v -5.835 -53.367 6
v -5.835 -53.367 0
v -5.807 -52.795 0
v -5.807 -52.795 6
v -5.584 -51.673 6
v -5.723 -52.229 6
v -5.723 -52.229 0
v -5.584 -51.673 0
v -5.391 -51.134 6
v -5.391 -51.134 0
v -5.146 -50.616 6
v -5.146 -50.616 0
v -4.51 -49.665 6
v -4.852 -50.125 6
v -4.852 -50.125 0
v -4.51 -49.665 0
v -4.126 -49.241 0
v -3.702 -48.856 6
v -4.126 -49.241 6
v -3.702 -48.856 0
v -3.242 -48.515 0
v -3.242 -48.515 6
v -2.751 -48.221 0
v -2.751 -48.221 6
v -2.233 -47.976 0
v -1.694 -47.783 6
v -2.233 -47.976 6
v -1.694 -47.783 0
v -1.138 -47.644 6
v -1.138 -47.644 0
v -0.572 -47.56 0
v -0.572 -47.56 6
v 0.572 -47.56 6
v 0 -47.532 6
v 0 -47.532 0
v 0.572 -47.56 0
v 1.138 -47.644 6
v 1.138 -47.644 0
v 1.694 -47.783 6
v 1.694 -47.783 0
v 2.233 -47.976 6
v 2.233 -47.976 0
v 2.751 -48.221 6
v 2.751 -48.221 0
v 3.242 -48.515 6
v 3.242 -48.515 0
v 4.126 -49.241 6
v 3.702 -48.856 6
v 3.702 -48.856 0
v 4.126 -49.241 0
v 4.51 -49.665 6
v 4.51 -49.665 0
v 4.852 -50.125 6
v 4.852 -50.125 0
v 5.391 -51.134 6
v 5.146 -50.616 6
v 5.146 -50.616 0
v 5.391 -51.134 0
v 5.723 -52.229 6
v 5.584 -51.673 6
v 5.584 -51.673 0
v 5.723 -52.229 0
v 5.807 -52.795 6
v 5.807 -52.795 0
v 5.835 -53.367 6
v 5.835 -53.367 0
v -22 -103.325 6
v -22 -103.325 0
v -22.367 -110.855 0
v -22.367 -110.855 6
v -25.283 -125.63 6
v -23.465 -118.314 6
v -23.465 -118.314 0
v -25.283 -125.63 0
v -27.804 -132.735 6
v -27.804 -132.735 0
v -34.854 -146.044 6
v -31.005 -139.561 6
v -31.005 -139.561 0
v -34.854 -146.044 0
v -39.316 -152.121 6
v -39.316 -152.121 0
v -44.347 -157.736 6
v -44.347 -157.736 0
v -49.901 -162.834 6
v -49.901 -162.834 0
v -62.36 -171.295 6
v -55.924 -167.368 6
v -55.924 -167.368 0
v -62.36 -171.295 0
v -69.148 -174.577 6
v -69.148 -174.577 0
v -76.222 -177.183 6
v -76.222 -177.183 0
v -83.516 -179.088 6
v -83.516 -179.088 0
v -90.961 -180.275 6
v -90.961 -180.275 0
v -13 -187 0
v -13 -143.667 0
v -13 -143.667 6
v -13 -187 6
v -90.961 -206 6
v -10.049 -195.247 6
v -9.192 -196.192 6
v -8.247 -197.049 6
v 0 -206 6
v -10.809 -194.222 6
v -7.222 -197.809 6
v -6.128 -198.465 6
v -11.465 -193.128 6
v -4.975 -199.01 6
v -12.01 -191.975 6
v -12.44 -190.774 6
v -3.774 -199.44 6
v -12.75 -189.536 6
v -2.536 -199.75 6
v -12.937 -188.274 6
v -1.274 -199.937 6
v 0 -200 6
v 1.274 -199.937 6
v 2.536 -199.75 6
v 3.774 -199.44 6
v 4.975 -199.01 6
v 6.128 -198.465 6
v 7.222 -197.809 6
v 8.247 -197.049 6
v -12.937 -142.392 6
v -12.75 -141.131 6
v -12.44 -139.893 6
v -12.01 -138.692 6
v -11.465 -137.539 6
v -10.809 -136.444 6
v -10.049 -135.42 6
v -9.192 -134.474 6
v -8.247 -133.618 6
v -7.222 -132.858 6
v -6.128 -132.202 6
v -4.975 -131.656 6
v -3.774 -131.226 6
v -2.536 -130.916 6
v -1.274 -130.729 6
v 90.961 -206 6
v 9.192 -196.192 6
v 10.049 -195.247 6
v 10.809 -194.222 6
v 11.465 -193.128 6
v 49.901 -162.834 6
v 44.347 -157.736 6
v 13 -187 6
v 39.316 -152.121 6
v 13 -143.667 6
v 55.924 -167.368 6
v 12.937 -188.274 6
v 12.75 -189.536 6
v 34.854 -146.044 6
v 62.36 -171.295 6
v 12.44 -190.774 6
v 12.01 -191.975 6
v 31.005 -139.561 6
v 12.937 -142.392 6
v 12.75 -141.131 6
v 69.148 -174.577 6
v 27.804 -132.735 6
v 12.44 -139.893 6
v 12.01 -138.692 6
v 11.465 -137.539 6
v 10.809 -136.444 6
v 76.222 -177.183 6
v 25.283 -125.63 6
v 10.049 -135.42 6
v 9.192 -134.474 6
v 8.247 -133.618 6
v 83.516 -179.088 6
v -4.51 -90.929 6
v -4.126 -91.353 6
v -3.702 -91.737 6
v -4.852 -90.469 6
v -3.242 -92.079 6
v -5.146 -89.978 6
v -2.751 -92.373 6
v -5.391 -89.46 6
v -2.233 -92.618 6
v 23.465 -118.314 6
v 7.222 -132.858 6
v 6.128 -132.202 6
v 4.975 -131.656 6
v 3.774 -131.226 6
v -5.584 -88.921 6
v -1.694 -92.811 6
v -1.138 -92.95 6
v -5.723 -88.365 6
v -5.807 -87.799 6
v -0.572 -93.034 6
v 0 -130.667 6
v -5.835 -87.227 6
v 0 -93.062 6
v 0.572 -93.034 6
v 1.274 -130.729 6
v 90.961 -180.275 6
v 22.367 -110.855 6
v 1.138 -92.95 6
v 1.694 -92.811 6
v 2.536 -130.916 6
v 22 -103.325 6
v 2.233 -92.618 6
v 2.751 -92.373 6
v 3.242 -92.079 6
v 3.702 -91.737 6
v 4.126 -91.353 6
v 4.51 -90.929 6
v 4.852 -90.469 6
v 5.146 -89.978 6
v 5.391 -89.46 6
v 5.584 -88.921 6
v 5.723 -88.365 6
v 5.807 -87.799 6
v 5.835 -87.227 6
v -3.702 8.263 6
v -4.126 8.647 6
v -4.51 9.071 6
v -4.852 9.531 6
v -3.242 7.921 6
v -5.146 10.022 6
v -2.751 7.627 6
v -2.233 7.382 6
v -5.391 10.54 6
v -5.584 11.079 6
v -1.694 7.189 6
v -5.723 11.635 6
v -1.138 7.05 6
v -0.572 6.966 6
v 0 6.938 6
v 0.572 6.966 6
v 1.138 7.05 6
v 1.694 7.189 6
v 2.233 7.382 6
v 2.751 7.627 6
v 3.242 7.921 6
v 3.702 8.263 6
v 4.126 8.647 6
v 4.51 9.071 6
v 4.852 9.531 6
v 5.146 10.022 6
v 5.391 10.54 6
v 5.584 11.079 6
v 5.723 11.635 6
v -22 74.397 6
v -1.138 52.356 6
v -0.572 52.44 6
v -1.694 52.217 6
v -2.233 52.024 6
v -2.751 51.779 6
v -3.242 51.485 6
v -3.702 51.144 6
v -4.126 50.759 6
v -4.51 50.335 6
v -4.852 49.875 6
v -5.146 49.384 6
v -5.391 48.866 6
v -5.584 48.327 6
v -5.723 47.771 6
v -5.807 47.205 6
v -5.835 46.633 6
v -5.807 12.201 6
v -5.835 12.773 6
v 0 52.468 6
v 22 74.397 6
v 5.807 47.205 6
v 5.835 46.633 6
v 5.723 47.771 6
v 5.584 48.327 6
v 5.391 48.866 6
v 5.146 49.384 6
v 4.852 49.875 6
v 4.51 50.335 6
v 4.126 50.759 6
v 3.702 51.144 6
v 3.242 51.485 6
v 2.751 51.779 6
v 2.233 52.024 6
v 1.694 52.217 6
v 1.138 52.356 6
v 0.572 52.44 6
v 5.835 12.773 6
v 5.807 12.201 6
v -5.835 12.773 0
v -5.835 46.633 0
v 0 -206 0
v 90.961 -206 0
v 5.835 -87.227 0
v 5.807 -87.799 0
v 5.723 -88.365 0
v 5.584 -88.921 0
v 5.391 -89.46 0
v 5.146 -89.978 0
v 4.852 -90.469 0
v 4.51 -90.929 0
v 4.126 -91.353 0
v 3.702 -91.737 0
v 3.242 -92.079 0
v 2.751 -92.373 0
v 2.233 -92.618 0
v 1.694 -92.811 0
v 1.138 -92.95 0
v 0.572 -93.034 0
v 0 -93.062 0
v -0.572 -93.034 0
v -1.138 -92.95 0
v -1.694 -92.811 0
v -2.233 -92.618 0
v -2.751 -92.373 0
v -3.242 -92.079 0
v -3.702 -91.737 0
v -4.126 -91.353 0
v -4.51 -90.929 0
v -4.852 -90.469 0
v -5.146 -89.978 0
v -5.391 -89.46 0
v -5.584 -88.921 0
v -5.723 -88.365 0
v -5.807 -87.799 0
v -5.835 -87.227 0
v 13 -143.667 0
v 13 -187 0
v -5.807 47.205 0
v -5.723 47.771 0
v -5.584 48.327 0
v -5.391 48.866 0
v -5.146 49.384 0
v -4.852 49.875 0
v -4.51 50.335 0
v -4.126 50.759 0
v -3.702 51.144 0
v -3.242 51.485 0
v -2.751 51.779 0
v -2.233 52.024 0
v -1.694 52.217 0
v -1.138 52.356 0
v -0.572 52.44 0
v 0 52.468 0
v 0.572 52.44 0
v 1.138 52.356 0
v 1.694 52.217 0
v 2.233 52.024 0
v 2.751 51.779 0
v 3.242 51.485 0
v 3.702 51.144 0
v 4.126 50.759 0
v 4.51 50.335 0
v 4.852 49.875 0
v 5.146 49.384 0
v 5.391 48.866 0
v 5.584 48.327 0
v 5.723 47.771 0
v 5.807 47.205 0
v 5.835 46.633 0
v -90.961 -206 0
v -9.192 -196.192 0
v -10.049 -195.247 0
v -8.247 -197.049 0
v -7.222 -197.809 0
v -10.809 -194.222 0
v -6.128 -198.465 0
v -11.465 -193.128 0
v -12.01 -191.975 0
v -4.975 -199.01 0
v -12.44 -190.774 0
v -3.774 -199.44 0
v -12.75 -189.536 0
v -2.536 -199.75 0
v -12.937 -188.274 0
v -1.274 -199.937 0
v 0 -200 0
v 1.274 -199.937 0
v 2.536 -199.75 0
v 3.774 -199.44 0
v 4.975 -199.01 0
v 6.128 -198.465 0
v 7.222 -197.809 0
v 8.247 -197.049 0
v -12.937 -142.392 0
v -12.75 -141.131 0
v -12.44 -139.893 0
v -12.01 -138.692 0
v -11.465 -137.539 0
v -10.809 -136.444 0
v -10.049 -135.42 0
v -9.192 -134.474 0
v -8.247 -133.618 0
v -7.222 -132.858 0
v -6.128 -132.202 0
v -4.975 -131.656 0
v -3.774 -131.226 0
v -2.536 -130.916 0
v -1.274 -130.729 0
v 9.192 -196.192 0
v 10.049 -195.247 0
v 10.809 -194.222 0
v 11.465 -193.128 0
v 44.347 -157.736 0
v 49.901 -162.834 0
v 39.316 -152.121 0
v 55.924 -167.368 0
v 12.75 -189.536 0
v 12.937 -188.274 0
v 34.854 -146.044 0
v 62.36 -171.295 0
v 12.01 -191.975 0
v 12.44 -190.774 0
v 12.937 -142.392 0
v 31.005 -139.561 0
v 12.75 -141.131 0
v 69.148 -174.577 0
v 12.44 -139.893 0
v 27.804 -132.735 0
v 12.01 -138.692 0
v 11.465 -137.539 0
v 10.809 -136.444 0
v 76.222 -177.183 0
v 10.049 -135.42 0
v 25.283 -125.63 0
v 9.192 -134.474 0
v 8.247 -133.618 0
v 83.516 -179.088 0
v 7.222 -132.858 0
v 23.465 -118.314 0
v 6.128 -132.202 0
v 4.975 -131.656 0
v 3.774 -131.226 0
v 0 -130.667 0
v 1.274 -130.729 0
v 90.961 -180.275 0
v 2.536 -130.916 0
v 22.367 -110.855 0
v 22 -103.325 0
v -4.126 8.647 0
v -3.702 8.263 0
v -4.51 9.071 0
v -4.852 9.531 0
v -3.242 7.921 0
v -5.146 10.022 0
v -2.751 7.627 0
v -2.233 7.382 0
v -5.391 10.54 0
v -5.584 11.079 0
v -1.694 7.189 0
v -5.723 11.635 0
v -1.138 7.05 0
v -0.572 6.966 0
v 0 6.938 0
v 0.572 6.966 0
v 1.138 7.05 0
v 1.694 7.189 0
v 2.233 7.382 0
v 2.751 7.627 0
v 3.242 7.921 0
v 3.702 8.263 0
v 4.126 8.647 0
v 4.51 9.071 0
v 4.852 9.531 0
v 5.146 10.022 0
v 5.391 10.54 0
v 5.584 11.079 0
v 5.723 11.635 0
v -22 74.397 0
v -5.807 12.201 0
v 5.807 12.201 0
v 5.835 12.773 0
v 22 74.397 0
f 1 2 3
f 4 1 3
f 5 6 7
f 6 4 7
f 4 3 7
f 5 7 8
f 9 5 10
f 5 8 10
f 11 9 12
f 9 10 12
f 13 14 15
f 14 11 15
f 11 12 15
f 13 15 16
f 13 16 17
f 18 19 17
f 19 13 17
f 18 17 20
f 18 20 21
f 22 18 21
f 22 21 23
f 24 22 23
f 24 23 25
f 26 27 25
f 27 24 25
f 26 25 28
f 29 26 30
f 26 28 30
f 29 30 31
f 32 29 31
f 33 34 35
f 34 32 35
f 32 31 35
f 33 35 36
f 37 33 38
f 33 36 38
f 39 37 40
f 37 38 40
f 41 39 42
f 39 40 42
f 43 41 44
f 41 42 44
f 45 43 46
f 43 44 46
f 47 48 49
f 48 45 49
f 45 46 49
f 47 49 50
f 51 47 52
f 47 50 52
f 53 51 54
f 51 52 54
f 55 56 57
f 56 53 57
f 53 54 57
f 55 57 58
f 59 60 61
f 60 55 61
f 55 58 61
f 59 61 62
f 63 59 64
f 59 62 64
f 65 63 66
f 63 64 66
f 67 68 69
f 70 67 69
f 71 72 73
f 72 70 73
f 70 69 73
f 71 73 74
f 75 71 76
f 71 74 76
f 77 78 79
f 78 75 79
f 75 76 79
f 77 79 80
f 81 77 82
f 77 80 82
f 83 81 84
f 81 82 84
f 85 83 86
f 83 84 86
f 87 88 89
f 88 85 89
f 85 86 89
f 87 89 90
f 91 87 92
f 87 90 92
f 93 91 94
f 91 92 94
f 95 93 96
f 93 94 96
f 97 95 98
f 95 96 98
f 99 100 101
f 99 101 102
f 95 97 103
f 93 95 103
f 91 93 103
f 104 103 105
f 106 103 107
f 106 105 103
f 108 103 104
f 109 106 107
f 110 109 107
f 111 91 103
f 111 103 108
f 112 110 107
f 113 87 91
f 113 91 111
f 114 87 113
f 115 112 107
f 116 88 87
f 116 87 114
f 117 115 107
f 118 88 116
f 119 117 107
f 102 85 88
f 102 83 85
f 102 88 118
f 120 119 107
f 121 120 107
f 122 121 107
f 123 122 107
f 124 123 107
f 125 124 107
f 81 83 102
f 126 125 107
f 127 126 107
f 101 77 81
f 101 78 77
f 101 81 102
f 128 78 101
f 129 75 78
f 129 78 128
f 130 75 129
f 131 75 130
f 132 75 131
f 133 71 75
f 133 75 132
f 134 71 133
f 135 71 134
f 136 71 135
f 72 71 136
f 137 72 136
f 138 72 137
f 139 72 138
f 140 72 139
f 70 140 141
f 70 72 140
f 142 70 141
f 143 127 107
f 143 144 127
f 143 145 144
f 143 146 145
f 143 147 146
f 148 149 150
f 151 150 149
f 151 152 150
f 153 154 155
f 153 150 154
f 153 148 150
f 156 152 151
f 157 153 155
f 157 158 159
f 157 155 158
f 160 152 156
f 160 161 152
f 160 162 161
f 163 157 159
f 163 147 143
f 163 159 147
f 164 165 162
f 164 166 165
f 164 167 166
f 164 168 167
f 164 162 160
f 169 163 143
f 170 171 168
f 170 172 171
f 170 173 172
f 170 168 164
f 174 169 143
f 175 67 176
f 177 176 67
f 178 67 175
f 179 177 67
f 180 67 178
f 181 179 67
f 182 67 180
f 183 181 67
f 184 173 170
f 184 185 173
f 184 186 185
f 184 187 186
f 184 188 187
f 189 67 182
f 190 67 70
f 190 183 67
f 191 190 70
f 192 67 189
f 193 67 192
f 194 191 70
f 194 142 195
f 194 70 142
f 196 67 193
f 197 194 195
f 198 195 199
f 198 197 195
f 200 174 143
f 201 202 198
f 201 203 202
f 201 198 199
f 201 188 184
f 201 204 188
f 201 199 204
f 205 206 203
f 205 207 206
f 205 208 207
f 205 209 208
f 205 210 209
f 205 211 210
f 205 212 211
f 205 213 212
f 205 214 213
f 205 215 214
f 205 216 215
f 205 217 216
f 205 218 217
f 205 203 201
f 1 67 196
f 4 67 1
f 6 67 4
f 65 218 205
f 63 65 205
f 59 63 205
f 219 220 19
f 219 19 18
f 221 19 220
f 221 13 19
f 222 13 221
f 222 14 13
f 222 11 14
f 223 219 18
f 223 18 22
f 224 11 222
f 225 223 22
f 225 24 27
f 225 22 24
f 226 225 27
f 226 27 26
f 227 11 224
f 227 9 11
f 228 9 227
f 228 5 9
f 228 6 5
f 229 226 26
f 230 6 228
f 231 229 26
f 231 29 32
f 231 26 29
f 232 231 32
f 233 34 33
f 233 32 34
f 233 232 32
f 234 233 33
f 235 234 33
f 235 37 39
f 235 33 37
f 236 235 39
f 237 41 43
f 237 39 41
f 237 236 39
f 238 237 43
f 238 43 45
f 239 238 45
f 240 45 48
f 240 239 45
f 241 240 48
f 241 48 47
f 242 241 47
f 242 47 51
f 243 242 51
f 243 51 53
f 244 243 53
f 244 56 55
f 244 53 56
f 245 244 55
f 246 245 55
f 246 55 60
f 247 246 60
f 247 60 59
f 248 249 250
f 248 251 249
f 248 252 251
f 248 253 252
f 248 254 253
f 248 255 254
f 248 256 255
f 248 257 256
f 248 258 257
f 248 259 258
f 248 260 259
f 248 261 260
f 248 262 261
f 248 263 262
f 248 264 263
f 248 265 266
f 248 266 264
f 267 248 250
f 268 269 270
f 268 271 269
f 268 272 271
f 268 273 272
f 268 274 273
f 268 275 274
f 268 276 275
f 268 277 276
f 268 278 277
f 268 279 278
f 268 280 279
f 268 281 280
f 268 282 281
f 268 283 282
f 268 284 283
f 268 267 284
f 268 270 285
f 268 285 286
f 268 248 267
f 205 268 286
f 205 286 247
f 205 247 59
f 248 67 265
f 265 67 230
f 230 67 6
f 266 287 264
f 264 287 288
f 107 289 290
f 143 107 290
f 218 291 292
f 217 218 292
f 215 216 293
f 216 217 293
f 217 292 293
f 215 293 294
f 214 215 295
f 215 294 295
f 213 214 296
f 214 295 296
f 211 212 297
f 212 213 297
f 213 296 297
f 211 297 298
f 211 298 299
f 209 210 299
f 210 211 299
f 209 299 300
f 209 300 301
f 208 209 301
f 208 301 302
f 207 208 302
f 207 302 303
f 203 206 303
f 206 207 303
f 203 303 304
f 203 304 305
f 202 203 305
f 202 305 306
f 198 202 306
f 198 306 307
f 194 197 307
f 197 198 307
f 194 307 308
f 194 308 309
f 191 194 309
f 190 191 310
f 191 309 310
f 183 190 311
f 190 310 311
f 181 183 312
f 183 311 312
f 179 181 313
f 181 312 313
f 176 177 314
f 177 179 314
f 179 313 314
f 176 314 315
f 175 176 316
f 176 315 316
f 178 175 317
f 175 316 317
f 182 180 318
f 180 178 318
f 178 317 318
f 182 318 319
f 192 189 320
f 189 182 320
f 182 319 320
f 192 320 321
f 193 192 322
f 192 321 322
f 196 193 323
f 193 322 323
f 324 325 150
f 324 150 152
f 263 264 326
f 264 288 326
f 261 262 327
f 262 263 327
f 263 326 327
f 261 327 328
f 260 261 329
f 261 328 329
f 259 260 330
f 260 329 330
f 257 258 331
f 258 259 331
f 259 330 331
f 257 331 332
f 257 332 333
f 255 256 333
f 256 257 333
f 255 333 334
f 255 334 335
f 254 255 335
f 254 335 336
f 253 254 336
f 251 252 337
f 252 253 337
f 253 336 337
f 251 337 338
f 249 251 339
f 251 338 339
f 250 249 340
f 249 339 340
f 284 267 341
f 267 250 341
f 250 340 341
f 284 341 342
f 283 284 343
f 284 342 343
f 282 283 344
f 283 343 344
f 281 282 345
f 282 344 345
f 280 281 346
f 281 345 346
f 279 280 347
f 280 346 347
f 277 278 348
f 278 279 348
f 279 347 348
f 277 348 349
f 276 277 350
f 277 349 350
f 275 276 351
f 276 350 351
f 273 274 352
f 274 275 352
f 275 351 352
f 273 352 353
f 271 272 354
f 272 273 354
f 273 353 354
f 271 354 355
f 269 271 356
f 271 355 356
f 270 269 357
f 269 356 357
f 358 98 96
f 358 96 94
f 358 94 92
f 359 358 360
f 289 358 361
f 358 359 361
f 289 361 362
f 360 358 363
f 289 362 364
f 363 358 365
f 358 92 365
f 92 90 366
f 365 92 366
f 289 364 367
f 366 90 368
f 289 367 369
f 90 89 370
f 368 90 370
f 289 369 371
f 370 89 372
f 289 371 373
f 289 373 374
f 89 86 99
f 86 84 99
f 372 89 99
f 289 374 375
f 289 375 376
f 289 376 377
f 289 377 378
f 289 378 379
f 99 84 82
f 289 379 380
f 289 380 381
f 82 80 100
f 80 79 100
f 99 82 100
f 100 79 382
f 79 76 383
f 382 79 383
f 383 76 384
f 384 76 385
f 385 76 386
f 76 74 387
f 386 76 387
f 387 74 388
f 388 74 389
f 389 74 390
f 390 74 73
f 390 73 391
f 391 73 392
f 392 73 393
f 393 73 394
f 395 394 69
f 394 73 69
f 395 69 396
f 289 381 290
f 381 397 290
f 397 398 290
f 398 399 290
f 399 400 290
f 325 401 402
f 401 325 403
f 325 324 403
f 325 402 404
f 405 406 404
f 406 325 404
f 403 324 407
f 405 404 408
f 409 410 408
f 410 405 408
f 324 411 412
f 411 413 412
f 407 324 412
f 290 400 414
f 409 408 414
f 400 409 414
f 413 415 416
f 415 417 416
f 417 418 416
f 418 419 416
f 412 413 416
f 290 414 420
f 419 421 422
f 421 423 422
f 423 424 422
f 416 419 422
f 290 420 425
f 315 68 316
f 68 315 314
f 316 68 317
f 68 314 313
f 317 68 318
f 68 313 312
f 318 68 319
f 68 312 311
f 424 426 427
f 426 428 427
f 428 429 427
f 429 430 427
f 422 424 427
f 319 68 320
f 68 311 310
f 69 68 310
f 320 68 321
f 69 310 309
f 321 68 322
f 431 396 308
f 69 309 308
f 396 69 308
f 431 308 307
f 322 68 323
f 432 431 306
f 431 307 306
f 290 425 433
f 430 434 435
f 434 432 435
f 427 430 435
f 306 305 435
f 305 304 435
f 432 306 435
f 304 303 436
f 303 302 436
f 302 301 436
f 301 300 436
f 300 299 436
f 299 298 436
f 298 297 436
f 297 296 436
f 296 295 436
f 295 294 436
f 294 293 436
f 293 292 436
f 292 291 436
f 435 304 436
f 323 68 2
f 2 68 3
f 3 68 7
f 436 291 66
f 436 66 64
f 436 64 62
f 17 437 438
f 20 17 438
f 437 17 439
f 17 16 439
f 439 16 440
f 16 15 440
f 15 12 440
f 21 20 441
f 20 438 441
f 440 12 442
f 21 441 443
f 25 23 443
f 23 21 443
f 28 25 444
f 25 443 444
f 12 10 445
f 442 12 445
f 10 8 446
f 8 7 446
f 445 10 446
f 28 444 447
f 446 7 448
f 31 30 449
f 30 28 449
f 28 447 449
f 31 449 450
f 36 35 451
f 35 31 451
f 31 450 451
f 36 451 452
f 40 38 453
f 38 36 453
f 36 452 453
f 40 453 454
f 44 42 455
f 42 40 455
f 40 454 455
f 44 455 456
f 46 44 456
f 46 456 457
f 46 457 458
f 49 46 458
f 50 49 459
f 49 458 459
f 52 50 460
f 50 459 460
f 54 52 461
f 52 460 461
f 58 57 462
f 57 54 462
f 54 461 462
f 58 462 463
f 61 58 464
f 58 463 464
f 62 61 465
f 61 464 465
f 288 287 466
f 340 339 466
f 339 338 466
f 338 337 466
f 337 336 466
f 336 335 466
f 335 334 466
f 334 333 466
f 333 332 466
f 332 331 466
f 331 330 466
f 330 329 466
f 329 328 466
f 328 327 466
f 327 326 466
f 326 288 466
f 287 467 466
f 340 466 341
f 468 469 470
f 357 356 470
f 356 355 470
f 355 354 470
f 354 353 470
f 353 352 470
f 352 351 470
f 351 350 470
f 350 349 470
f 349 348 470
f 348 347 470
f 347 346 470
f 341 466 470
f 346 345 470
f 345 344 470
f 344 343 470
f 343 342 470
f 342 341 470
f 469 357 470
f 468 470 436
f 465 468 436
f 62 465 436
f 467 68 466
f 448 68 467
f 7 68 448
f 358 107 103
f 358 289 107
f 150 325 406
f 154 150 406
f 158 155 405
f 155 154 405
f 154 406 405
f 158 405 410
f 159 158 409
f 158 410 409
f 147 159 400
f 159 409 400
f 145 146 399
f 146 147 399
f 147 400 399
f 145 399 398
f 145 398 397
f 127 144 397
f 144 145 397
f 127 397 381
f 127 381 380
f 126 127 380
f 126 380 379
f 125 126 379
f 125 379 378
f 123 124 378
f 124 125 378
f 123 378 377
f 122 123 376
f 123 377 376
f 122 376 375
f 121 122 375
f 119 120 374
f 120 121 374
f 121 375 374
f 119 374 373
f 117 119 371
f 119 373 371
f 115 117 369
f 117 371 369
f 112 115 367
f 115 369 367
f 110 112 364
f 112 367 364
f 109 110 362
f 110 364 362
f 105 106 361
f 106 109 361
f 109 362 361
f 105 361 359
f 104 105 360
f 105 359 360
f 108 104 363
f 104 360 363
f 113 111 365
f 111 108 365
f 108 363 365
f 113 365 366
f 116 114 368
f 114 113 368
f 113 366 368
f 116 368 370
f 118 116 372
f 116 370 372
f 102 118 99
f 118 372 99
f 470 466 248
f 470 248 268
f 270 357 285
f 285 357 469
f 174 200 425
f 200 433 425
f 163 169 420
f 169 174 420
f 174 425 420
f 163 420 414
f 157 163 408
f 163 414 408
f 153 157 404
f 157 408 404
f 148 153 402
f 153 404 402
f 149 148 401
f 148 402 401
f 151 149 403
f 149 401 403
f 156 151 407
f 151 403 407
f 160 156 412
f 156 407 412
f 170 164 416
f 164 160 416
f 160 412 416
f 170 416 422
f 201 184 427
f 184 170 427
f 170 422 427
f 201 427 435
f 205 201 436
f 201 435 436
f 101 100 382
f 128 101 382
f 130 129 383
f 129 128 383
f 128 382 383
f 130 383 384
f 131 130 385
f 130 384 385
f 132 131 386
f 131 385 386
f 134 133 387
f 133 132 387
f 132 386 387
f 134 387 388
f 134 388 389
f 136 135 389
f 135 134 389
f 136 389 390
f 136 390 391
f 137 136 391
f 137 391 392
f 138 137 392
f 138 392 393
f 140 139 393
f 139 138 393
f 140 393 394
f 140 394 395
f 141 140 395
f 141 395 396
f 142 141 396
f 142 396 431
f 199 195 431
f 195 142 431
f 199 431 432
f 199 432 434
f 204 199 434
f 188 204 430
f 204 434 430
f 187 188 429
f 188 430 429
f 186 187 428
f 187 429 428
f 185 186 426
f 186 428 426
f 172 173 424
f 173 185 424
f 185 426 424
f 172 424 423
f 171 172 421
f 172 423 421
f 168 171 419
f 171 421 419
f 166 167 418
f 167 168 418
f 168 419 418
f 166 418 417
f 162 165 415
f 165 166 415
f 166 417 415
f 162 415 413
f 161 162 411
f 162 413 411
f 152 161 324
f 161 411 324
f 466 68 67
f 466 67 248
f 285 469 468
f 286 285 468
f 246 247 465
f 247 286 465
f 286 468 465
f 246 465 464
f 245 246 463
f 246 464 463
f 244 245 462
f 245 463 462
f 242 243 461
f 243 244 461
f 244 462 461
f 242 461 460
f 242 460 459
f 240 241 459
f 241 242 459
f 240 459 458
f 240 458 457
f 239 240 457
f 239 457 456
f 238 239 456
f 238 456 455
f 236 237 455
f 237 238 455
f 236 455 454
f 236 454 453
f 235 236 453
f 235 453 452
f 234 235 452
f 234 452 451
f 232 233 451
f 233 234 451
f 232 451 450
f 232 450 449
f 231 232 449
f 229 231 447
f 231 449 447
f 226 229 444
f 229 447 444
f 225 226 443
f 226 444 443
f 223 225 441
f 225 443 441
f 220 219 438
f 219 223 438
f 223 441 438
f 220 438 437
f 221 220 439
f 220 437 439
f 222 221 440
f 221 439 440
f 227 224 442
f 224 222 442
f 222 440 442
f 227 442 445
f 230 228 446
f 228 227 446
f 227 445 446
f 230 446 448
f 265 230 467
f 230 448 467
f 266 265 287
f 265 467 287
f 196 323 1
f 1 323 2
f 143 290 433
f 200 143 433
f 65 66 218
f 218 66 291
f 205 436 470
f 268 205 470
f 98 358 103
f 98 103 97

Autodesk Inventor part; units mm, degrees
ref_plane "YZ Plane" through (0, 0, 0) normal (1, 0, 0) x (0, 1, 0)
ref_plane "XZ Plane" through (0, 0, 0) normal (0, 1, 0) x (-1, 0, 0)
ref_plane "XY Plane" through (0, 0, 0) normal (0, 0, 1) x (1, 0, 0)
sketch "Sketch1" plane through (0, 0, 0) normal (0, 0, 1) x (1, 0, 0)
  line L0 (10, -206) -> (-10, -206) construction
  line L1 (0, 0) -> (0, -45.7411)
  line L2 (-10, -206) -> (10, -206) construction
  arc A0 (-10, -160.3333) -> (10, -160.3333) centre (0, -160.3333) ccw projected
  line L3 (10, -143.6667) -> (10, -160.3333) projected
  line L4 (-10, -160.3333) -> (-10, -143.6667) projected
  arc A1 (10, -143.6667) -> (-10, -143.6667) centre (0, -143.6667) ccw projected
  circle A2 centre (-8, -187) radius 1.6 projected
  circle A3 centre (8, -187) radius 1.6 projected
  arc A4 (-5.8349, -87.227) -> (5.8349, -87.227) centre (0, -87.227) ccw projected
  line L5 (5.8349, -53.3669) -> (5.8349, -87.227) projected
  line L6 (-5.8349, -87.227) -> (-5.8349, -53.3669) projected
  arc A5 (5.8349, -53.3669) -> (-5.8349, -53.3669) centre (0, -53.3669) ccw projected
  line L7 (0, -206) -> (-90.9613, -206)
  line L8 (-90.9613, -206) -> (-90.9613, -180.2754)
  arc A6 (-90.9613, -180.2754) -> (-22, -103.3247) centre (-99.4135, -103.3247) ccw
  line L9 (-22, -103.3247) -> (-22, 74.3972)
  line L10 (0, -143.6667) -> (0, -187) construction
  line L11 (-13, -143.6667) -> (-13, -187)
  line L12 (13, -187) -> (13, -143.6667)
  arc A7 (13, -143.6667) -> (-13, -143.6667) centre (0, -143.6667) ccw
  arc A8 (-13, -187) -> (13, -187) centre (0, -187) ccw
  line L13 (0, -206) -> (90.9613, -206)
  line L14 (90.9613, -206) -> (90.9613, -180.2754)
  arc A9 (22, -103.3247) -> (90.9613, -180.2754) centre (99.4135, -103.3247) ccw
  line L15 (22, -103.3247) -> (22, 74.3972)
  line L16 (5.8349, 46.6331) -> (5.8349, 12.773) projected
  arc A10 (-5.8349, 12.773) -> (5.8349, 12.773) centre (0, 12.773) ccw projected
  line L17 (-5.8349, 12.773) -> (-5.8349, 46.6331) projected
  arc A11 (5.8349, 46.6331) -> (-5.8349, 46.6331) centre (0, 46.6331) ccw projected
  line L18 (-22, 74.3972) -> (22, 74.3972)
  point P0 (0, -165.3333)
  dimension "d2" = 26
  dimension "d5" = 22
extrude "Extrusion1" add sketch "Sketch1" along normal blind 6 contours L7 L8 A6 L9 L18 L15 A9 L14 L13
properties part number "Camera stabiliser"
